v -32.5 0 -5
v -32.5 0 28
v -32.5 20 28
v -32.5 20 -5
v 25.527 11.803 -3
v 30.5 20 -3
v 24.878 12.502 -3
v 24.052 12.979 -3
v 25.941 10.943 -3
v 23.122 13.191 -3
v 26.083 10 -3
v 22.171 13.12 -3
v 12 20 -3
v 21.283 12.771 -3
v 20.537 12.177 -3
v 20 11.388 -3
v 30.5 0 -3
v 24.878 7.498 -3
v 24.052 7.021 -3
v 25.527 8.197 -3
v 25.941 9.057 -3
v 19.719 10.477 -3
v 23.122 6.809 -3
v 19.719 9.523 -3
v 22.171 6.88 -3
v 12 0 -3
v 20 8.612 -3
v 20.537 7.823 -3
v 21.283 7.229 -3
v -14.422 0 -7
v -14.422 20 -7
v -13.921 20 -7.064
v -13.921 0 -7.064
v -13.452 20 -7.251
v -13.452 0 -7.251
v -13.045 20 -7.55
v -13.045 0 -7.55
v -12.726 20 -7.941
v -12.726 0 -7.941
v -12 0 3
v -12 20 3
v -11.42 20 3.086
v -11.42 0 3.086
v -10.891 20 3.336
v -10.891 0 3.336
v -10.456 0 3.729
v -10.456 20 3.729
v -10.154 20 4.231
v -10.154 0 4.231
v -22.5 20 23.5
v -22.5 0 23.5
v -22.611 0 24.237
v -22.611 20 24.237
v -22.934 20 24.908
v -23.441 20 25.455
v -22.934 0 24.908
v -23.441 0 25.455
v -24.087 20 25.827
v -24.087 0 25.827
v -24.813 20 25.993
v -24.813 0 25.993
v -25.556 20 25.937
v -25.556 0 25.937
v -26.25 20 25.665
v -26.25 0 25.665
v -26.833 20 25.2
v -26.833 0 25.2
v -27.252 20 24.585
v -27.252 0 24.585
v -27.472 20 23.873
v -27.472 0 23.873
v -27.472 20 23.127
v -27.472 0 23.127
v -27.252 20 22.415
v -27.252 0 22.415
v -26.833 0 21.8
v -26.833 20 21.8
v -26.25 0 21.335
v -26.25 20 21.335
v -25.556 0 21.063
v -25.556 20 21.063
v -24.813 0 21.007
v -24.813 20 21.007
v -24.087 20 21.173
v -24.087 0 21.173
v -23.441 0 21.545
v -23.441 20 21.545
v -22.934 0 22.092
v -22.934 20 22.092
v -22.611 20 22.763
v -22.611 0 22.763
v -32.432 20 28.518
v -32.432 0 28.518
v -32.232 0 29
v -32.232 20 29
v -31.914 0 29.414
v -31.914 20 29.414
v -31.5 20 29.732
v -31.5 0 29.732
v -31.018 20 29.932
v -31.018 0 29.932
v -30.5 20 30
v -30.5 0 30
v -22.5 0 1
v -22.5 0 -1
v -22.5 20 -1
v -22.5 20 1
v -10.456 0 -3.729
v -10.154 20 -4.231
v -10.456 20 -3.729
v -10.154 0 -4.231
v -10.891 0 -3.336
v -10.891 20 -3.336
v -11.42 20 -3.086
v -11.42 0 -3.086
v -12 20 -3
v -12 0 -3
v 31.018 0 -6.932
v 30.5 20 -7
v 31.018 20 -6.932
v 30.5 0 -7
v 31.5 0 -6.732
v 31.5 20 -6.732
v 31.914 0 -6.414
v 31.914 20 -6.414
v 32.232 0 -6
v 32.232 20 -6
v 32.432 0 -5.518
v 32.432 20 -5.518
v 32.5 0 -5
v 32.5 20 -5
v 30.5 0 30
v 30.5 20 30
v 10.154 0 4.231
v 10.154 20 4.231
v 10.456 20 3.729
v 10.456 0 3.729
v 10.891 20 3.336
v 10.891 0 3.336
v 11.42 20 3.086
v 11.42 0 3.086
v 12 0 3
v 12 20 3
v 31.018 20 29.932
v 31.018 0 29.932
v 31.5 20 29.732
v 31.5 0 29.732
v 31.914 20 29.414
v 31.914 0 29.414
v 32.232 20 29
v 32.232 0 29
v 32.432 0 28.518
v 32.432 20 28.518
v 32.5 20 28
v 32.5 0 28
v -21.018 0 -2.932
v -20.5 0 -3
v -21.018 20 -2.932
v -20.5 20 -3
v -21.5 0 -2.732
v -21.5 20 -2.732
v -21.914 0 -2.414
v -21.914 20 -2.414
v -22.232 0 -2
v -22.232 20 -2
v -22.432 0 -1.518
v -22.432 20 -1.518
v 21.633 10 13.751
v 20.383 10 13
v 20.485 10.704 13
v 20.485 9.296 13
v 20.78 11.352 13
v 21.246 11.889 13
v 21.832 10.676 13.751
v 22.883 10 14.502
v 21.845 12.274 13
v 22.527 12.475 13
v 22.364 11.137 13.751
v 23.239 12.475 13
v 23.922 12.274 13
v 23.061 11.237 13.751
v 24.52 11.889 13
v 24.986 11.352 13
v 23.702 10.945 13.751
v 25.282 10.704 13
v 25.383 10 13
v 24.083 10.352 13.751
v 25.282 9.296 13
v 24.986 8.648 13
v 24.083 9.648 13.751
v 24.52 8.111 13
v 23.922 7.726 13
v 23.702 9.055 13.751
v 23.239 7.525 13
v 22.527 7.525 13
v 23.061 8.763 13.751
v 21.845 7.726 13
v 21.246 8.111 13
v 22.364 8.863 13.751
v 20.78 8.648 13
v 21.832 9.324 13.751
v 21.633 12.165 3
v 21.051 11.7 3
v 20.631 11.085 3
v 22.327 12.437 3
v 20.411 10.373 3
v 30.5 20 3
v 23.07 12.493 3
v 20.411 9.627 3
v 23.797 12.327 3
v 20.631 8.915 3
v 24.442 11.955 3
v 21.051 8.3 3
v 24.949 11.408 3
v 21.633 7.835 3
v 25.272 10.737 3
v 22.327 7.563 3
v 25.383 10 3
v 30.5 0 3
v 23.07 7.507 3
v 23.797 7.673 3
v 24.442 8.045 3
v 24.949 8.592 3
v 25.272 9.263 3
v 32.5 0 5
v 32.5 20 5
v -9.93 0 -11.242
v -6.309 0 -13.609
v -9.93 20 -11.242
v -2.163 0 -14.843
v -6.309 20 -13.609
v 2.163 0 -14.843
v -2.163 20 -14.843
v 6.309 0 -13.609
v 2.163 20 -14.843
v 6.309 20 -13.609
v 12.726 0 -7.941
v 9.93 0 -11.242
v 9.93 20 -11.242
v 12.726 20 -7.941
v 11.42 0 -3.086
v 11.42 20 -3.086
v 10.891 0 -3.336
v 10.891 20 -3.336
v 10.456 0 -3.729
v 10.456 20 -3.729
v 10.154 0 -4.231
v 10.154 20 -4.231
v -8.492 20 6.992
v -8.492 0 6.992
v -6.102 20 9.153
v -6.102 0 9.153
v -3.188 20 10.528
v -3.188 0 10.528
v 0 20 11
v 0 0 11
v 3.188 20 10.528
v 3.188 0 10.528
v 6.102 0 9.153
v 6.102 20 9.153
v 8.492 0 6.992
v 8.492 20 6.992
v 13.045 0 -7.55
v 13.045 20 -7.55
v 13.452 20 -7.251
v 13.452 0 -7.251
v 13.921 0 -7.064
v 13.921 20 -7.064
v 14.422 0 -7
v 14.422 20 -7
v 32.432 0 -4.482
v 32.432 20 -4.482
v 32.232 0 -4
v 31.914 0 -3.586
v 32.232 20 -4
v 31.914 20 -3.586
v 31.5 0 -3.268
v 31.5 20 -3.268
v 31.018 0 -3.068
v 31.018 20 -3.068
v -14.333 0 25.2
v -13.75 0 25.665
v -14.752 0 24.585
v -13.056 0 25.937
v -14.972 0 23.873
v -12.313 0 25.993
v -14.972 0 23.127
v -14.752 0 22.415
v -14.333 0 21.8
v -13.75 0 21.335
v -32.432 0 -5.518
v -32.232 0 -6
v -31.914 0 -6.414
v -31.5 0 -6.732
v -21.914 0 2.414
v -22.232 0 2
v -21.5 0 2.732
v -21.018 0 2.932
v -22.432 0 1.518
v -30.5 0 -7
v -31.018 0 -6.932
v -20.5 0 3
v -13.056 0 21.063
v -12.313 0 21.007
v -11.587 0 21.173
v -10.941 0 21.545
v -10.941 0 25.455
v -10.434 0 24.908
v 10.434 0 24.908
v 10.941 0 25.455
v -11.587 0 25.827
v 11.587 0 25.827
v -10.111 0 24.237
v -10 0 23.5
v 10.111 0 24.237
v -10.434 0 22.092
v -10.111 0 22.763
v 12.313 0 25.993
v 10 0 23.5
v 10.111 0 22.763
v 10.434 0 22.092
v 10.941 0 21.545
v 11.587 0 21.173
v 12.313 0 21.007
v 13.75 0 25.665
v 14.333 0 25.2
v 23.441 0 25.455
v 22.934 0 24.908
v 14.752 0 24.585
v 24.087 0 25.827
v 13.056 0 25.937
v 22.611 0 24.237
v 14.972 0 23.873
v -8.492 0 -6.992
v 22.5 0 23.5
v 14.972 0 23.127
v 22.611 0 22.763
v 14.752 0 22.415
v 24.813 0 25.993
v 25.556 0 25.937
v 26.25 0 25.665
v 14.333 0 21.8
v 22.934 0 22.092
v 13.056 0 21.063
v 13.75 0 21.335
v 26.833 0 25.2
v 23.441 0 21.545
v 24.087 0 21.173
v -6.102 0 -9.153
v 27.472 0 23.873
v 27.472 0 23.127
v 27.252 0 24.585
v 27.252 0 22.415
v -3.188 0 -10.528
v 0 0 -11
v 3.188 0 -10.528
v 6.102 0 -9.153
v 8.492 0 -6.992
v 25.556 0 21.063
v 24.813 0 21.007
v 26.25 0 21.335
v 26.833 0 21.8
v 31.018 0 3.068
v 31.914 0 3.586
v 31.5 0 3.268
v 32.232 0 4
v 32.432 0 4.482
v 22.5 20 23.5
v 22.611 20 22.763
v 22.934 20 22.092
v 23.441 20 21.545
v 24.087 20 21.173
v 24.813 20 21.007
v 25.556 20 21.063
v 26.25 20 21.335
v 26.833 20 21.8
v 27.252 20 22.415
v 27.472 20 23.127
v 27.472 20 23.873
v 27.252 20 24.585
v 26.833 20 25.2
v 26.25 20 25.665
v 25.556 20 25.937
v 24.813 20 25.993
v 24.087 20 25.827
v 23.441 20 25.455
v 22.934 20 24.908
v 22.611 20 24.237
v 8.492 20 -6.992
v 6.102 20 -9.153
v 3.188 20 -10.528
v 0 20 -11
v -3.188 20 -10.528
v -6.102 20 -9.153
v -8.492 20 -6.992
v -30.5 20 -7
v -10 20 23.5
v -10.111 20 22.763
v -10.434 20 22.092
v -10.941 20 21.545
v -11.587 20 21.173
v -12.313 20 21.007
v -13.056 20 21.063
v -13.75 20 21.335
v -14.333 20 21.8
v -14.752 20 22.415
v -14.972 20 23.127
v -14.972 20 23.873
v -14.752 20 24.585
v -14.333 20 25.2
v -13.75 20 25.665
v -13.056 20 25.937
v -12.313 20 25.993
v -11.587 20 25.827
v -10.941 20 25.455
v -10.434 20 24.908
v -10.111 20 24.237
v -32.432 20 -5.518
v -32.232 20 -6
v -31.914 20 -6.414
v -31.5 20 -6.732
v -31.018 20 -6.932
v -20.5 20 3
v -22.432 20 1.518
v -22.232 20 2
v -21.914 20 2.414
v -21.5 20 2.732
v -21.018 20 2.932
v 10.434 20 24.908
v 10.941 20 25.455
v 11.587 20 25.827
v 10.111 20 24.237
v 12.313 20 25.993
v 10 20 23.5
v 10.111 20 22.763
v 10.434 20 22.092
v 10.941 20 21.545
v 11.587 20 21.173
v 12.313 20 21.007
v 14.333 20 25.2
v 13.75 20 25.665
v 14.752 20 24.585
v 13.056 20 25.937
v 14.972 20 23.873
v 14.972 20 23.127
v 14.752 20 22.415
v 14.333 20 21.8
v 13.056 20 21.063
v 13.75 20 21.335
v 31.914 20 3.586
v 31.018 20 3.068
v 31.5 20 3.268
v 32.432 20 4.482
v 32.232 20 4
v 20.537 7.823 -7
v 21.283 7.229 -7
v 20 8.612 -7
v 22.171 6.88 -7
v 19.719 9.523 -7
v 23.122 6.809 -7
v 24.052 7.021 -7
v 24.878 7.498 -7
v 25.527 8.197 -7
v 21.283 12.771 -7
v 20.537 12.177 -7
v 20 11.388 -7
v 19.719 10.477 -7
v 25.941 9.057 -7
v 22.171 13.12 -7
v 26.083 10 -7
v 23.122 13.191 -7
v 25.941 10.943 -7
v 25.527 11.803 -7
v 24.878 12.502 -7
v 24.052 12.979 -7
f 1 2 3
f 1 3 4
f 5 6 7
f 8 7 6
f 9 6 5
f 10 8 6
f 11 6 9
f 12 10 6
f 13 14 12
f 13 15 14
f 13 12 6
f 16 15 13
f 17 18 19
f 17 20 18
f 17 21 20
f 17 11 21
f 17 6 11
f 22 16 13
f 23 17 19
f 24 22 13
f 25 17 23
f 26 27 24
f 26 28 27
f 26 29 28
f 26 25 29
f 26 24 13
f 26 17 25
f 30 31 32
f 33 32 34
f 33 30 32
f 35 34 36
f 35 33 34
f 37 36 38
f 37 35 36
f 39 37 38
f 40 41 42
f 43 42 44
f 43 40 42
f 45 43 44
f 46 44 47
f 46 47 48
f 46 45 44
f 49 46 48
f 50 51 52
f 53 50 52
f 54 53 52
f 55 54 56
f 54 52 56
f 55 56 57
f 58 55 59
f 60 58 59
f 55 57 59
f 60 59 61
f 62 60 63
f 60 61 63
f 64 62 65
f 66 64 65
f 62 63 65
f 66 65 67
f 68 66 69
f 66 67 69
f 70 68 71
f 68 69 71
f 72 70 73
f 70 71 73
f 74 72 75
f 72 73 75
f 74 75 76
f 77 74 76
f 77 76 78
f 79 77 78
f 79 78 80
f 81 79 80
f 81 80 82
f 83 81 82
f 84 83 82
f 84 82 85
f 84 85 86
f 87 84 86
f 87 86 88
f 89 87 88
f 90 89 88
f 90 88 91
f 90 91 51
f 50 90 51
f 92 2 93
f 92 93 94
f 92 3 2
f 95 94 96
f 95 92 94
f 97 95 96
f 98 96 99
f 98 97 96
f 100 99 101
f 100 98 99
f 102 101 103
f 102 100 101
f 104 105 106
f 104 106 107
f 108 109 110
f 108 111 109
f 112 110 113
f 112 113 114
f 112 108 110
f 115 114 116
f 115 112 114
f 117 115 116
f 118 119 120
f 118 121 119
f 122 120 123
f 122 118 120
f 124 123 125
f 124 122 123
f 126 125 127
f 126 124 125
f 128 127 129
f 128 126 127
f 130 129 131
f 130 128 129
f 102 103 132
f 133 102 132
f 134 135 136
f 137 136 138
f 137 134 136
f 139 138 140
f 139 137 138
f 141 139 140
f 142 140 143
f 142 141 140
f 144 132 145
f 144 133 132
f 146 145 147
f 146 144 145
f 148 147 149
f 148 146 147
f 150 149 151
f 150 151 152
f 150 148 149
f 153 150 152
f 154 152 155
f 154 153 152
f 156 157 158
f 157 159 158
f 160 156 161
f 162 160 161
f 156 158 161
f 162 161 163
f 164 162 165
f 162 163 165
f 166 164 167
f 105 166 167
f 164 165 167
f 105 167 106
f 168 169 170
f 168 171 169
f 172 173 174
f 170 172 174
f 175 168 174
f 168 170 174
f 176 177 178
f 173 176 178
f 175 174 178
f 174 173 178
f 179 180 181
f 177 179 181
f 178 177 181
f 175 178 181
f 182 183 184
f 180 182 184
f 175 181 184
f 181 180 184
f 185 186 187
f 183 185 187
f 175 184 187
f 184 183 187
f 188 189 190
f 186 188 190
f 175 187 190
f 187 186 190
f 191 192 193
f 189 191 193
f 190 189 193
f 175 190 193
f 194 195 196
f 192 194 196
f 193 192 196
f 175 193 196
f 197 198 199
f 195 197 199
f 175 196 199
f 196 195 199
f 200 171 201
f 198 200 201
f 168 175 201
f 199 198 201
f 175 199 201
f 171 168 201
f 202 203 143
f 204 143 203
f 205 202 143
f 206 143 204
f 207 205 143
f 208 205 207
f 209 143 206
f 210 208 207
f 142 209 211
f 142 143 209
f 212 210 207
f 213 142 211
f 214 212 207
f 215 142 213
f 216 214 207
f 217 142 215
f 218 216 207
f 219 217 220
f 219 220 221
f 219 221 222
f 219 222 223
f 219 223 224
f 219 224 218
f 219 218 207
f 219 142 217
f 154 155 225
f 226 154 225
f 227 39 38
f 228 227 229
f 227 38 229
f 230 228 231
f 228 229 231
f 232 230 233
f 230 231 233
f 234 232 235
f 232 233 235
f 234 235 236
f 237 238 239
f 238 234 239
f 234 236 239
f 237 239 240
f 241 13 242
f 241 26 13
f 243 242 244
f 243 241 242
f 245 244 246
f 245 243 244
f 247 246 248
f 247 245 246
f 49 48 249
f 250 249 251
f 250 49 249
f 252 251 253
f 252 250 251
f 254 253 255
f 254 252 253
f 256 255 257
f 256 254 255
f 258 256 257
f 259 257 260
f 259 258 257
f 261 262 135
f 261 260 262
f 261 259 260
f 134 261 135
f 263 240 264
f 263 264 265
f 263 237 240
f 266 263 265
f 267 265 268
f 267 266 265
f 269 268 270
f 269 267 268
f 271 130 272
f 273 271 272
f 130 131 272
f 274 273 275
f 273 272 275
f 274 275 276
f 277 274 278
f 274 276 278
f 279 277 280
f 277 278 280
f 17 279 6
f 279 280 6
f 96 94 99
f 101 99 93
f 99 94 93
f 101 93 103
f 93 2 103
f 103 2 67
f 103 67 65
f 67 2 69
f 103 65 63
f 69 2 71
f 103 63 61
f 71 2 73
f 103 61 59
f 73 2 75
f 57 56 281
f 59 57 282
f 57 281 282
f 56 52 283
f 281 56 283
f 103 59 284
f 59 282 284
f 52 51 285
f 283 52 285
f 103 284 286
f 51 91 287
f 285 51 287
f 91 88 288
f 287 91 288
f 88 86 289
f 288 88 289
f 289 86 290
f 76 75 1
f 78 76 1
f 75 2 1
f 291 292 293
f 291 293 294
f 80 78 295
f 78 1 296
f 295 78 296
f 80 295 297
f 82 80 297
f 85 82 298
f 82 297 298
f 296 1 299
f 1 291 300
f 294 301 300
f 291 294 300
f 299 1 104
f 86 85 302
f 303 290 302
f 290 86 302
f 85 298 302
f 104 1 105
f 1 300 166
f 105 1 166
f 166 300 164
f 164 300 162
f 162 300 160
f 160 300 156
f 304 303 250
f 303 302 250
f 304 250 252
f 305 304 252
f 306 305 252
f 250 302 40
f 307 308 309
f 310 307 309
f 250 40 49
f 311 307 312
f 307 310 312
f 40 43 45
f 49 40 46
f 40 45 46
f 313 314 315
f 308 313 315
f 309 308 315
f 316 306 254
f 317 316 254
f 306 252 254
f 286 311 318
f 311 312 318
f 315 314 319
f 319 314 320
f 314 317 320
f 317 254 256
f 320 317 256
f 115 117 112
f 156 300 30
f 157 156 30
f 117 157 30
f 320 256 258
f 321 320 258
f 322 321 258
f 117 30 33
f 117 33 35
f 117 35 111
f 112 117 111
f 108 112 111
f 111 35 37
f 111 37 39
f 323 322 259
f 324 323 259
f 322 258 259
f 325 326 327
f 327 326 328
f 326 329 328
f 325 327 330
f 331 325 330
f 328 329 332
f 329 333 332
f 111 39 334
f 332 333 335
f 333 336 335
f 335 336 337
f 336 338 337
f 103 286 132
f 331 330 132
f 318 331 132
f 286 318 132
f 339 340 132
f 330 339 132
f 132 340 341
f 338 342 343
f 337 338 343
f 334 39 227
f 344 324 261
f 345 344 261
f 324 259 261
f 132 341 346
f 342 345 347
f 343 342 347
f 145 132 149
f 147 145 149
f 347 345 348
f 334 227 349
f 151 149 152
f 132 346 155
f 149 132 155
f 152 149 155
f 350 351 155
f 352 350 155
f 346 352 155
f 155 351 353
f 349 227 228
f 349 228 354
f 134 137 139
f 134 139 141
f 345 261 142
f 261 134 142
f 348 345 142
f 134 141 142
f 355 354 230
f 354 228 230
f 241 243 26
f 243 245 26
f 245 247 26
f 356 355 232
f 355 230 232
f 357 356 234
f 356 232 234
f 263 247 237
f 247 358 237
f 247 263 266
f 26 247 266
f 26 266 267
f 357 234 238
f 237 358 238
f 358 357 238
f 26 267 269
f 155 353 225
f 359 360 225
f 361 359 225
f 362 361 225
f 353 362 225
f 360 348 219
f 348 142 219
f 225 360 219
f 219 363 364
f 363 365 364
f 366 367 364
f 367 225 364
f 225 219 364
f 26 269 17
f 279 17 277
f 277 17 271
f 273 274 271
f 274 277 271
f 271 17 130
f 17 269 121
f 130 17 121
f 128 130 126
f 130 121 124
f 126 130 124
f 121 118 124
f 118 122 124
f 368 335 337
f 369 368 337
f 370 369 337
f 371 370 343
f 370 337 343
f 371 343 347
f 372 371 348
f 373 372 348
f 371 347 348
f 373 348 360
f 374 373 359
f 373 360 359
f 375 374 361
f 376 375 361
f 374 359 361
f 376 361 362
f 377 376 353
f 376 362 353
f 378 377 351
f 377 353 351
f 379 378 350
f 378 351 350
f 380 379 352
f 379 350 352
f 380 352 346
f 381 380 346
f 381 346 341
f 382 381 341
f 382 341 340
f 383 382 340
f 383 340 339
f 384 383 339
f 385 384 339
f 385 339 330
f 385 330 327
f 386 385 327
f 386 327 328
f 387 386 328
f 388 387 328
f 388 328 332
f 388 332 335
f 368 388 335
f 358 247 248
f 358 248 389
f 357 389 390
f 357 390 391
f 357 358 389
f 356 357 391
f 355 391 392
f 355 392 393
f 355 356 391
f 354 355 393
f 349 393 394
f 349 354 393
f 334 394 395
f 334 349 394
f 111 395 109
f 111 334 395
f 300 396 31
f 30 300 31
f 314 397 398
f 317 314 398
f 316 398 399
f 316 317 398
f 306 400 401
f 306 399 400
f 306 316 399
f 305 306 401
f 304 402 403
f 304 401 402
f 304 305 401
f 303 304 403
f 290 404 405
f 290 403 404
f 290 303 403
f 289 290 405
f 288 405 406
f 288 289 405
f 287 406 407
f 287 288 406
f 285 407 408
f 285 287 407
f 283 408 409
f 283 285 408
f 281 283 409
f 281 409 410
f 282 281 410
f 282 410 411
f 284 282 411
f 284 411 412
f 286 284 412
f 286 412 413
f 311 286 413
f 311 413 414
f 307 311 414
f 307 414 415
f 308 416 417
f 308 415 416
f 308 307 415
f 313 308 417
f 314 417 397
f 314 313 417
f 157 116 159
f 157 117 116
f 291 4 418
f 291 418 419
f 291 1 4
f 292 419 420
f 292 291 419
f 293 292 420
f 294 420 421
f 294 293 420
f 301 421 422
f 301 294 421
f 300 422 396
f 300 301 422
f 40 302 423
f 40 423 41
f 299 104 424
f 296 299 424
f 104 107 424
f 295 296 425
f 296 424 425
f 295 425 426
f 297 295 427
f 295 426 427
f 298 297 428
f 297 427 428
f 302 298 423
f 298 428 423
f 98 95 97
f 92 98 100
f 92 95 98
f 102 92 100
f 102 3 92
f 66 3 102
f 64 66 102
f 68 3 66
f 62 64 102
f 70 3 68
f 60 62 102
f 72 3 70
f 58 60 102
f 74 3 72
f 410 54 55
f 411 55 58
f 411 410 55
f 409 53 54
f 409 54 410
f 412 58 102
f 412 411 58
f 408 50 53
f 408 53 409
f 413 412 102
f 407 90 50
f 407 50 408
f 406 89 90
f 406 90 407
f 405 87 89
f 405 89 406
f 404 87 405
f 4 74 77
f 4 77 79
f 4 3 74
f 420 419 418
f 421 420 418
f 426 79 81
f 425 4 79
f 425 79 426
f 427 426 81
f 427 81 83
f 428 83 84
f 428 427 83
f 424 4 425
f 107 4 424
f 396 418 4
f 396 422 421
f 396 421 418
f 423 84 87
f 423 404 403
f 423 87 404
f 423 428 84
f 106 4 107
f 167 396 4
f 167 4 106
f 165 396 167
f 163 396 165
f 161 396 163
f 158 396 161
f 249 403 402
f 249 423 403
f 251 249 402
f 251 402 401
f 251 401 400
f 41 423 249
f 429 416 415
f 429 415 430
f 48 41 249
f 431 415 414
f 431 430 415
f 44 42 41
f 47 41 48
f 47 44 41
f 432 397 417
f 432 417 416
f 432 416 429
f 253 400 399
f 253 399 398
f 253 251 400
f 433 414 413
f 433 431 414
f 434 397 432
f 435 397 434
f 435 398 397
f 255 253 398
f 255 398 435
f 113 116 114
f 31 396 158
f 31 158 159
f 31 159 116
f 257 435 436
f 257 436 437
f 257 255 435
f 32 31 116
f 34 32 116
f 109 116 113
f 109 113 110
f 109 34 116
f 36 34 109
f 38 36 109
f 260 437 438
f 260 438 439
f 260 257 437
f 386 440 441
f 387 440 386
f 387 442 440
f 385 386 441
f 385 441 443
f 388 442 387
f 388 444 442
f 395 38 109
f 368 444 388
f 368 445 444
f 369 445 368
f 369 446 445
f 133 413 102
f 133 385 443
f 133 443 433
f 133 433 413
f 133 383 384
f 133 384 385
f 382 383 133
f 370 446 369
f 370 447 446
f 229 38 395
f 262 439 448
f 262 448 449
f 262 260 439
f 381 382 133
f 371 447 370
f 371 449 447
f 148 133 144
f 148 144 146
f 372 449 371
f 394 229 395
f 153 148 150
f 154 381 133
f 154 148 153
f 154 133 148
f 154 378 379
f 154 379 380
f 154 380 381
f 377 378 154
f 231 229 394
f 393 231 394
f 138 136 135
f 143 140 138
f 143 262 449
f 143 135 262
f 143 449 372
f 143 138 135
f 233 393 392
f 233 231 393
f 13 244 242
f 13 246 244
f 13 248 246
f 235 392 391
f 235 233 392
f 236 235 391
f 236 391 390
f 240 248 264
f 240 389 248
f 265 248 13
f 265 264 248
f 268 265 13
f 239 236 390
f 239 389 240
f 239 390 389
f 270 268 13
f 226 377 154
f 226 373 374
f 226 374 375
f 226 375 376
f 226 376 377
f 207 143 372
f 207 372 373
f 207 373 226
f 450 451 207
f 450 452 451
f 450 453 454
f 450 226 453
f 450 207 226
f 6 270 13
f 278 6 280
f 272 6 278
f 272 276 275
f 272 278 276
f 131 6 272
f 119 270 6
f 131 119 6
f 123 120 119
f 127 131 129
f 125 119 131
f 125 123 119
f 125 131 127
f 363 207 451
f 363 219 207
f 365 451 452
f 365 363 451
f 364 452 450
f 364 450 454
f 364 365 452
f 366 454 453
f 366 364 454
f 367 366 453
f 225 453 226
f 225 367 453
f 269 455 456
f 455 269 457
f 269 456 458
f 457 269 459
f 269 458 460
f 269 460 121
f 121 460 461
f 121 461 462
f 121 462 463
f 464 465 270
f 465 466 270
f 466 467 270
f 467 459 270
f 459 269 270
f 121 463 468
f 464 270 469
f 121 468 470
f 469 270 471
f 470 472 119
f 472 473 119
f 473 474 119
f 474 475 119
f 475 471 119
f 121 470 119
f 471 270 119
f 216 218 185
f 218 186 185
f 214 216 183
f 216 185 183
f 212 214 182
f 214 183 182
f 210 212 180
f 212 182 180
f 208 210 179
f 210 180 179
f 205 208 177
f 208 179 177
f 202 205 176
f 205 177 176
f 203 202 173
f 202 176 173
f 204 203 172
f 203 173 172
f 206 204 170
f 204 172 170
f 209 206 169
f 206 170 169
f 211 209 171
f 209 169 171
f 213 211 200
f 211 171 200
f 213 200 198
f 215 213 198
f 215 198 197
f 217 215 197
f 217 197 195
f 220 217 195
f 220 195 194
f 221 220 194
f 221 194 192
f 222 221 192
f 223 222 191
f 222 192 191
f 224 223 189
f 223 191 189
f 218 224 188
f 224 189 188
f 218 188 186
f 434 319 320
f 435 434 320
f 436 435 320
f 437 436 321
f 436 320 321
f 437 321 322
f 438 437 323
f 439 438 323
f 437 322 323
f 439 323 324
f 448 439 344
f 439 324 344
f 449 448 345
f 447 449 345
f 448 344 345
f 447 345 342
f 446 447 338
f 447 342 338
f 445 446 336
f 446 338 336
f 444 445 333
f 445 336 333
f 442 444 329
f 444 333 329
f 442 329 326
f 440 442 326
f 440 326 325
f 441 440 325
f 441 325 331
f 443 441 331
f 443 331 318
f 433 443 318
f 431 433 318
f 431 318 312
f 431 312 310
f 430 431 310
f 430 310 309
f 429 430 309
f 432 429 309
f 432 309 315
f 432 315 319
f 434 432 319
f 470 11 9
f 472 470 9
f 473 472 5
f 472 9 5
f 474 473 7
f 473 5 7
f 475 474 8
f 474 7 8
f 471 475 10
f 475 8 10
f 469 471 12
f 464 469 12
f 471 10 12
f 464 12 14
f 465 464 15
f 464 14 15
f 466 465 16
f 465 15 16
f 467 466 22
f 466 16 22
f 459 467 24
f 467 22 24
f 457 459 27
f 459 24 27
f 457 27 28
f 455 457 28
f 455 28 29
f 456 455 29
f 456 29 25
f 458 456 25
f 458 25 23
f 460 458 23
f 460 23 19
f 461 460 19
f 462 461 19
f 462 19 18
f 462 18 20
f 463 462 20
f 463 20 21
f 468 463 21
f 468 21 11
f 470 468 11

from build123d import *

# Parameters (mm, degrees)
SKETCH1_W                = 65
SKETCH1_H                = 60
SKETCH1_R                = 11
BOSS_EXTRUDE1_DEPTH      = 20
CUT_EXTRUDE1_DEPTH       = 49.541219597
CUT_EXTRUDE1_DEPTH_BACK  = 49.541219597
M6_TAPPED_HOLE2_D        = 5
LPATTERN2_COUNT          = 2
LPATTERN2_PITCH          = 12.5
MIRROR2_COPY_1_D         = 5
CUT_EXTRUDE2_DEPTH       = 49.541219597
M6_CLEARANCE_HOLE1_D     = 6.4
M6_CLEARANCE_HOLE1_DEPTH = 4
M6_TAPPED_HOLE1_D        = 5
M6_TAPPED_HOLE1_DEPTH    = 10
M6_TAPPED_HOLE1_TIP      = 1.502151548
FILLET1_R                = 2


with BuildPart() as part:
    # Sketch1 → Boss-Extrude1 (new body)
    with BuildSketch(Plane(origin=(0, 0, 0), x_dir=(1, 0, 0), z_dir=(0, 1, 0))):
        Rectangle(SKETCH1_W, SKETCH1_H)
        with Locations(Location((0, 0, 0), (0, 0, 270))):
            Circle(SKETCH1_R, mode=Mode.SUBTRACT)
    extrude(amount=BOSS_EXTRUDE1_DEPTH)

    # Sketch2 → Cut-Extrude1 (cut, two sides: drawn at the far end of the back side and taken through both)
    with BuildSketch(Plane(origin=(0, 20, 0), x_dir=(1, 0, 0), z_dir=(0, 1, 0)).offset(-CUT_EXTRUDE1_DEPTH_BACK)):
        Polygon((188.294375749, 3), (32.5, 3), (-22.5, 3), (-22.5, -3), (32.5, -3), (188.294375749, -3), (499.883127247, -3), (499.883127247, 3), align=None)
    extrude(amount=CUT_EXTRUDE1_DEPTH + CUT_EXTRUDE1_DEPTH_BACK, mode=Mode.SUBTRACT)

    # M6 Tapped Hole2 (through all)
    with Locations(Plane(origin=(0, 20, 0), x_dir=(1, 0, 0), z_dir=(0, 1, 0))):
        with Locations((12.5, -23.5)):
            m6_tapped_hole2 = Hole(M6_TAPPED_HOLE2_D / 2)

    # LPattern2: M6 Tapped Hole2 ×2
    with Locations(*[(i * LPATTERN2_PITCH, 0, 0) for i in range(1, LPATTERN2_COUNT)]):
        add(m6_tapped_hole2, mode=Mode.SUBTRACT)

    # Mirror2: M6 Tapped Hole2 across plane
    add(m6_tapped_hole2.mirror(Plane(origin=(0, 0, 0), x_dir=(0, 0, 1), z_dir=(1, 0, 0))), mode=Mode.SUBTRACT)

    # Mirror2 copy 1 (through all)
    with Locations(Plane(origin=(-12.5, 20, 0), x_dir=(-1, 0, 0), z_dir=(0, 1, 0))):
        with Locations((12.5, 23.5)):
            Hole(MIRROR2_COPY_1_D / 2)

    # Sketch6 → Cut-Extrude2 (cut, through all)
    with BuildSketch(Plane(origin=(0, 20, 0), x_dir=(1, 0, 0), z_dir=(0, 1, 0))):
        with BuildLine():
            Line((-32.5, 7), (-13.266499161, 7))
            ThreePointArc((-13.266499161, 7), (0, 15), (13.266499161, 7))
            Line((13.266499161, 7), (32.5, 7))
            Line((32.5, 7), (32.5, 30))
            Line((32.5, 30), (-32.5, 30))
            Line((-32.5, 30), (-32.5, 7))
        make_face()
    extrude(amount=-CUT_EXTRUDE2_DEPTH, mode=Mode.SUBTRACT)

    # M6 Clearance Hole1
    with Locations(Plane(origin=(0, 0, -7), x_dir=(-1, 0, 0), z_dir=(0, 0, -1))):
        with Locations((-22.883249581, 10)):
            Hole(M6_CLEARANCE_HOLE1_D / 2, depth=M6_CLEARANCE_HOLE1_DEPTH)

    # M6 Tapped Hole1
    with Locations(Plane(origin=(0, 0, 3), x_dir=(-1, 0, 0), z_dir=(0, 0, -1))):
        with Locations((-22.883249581, 10)):
            Hole(M6_TAPPED_HOLE1_D / 2, depth=M6_TAPPED_HOLE1_DEPTH)
            with Locations((0, 0, -(M6_TAPPED_HOLE1_DEPTH + M6_TAPPED_HOLE1_TIP / 2))):  # 118° drill point
                Cone(0, M6_TAPPED_HOLE1_D / 2, M6_TAPPED_HOLE1_TIP, mode=Mode.SUBTRACT)

    # Fillet1
    fillet1_edges = [part.edges().sort_by_distance(p)[0] for p in [
        (-10.583005244, 10, 3),
        (10.583005244, 10, 3),
        (10.583005244, 10, -3),
        (-10.583005244, 10, -3),
        (-22.5, 10, 3),
        (-22.5, 10, -3),
        (32.5, 10, 3),
        (32.5, 10, -3),
        (-32.5, 10, -7),
        (32.5, 10, -7),
        (13.266499161, 10, -7),
        (-13.266499161, 10, -7),
        (32.5, 10, 30),
        (-32.5, 10, 30),
    ]]
    fillet(fillet1_edges, radius=FILLET1_R - 0.0001)  # a hair under: the kernel refuses the full size


solid = part.part
